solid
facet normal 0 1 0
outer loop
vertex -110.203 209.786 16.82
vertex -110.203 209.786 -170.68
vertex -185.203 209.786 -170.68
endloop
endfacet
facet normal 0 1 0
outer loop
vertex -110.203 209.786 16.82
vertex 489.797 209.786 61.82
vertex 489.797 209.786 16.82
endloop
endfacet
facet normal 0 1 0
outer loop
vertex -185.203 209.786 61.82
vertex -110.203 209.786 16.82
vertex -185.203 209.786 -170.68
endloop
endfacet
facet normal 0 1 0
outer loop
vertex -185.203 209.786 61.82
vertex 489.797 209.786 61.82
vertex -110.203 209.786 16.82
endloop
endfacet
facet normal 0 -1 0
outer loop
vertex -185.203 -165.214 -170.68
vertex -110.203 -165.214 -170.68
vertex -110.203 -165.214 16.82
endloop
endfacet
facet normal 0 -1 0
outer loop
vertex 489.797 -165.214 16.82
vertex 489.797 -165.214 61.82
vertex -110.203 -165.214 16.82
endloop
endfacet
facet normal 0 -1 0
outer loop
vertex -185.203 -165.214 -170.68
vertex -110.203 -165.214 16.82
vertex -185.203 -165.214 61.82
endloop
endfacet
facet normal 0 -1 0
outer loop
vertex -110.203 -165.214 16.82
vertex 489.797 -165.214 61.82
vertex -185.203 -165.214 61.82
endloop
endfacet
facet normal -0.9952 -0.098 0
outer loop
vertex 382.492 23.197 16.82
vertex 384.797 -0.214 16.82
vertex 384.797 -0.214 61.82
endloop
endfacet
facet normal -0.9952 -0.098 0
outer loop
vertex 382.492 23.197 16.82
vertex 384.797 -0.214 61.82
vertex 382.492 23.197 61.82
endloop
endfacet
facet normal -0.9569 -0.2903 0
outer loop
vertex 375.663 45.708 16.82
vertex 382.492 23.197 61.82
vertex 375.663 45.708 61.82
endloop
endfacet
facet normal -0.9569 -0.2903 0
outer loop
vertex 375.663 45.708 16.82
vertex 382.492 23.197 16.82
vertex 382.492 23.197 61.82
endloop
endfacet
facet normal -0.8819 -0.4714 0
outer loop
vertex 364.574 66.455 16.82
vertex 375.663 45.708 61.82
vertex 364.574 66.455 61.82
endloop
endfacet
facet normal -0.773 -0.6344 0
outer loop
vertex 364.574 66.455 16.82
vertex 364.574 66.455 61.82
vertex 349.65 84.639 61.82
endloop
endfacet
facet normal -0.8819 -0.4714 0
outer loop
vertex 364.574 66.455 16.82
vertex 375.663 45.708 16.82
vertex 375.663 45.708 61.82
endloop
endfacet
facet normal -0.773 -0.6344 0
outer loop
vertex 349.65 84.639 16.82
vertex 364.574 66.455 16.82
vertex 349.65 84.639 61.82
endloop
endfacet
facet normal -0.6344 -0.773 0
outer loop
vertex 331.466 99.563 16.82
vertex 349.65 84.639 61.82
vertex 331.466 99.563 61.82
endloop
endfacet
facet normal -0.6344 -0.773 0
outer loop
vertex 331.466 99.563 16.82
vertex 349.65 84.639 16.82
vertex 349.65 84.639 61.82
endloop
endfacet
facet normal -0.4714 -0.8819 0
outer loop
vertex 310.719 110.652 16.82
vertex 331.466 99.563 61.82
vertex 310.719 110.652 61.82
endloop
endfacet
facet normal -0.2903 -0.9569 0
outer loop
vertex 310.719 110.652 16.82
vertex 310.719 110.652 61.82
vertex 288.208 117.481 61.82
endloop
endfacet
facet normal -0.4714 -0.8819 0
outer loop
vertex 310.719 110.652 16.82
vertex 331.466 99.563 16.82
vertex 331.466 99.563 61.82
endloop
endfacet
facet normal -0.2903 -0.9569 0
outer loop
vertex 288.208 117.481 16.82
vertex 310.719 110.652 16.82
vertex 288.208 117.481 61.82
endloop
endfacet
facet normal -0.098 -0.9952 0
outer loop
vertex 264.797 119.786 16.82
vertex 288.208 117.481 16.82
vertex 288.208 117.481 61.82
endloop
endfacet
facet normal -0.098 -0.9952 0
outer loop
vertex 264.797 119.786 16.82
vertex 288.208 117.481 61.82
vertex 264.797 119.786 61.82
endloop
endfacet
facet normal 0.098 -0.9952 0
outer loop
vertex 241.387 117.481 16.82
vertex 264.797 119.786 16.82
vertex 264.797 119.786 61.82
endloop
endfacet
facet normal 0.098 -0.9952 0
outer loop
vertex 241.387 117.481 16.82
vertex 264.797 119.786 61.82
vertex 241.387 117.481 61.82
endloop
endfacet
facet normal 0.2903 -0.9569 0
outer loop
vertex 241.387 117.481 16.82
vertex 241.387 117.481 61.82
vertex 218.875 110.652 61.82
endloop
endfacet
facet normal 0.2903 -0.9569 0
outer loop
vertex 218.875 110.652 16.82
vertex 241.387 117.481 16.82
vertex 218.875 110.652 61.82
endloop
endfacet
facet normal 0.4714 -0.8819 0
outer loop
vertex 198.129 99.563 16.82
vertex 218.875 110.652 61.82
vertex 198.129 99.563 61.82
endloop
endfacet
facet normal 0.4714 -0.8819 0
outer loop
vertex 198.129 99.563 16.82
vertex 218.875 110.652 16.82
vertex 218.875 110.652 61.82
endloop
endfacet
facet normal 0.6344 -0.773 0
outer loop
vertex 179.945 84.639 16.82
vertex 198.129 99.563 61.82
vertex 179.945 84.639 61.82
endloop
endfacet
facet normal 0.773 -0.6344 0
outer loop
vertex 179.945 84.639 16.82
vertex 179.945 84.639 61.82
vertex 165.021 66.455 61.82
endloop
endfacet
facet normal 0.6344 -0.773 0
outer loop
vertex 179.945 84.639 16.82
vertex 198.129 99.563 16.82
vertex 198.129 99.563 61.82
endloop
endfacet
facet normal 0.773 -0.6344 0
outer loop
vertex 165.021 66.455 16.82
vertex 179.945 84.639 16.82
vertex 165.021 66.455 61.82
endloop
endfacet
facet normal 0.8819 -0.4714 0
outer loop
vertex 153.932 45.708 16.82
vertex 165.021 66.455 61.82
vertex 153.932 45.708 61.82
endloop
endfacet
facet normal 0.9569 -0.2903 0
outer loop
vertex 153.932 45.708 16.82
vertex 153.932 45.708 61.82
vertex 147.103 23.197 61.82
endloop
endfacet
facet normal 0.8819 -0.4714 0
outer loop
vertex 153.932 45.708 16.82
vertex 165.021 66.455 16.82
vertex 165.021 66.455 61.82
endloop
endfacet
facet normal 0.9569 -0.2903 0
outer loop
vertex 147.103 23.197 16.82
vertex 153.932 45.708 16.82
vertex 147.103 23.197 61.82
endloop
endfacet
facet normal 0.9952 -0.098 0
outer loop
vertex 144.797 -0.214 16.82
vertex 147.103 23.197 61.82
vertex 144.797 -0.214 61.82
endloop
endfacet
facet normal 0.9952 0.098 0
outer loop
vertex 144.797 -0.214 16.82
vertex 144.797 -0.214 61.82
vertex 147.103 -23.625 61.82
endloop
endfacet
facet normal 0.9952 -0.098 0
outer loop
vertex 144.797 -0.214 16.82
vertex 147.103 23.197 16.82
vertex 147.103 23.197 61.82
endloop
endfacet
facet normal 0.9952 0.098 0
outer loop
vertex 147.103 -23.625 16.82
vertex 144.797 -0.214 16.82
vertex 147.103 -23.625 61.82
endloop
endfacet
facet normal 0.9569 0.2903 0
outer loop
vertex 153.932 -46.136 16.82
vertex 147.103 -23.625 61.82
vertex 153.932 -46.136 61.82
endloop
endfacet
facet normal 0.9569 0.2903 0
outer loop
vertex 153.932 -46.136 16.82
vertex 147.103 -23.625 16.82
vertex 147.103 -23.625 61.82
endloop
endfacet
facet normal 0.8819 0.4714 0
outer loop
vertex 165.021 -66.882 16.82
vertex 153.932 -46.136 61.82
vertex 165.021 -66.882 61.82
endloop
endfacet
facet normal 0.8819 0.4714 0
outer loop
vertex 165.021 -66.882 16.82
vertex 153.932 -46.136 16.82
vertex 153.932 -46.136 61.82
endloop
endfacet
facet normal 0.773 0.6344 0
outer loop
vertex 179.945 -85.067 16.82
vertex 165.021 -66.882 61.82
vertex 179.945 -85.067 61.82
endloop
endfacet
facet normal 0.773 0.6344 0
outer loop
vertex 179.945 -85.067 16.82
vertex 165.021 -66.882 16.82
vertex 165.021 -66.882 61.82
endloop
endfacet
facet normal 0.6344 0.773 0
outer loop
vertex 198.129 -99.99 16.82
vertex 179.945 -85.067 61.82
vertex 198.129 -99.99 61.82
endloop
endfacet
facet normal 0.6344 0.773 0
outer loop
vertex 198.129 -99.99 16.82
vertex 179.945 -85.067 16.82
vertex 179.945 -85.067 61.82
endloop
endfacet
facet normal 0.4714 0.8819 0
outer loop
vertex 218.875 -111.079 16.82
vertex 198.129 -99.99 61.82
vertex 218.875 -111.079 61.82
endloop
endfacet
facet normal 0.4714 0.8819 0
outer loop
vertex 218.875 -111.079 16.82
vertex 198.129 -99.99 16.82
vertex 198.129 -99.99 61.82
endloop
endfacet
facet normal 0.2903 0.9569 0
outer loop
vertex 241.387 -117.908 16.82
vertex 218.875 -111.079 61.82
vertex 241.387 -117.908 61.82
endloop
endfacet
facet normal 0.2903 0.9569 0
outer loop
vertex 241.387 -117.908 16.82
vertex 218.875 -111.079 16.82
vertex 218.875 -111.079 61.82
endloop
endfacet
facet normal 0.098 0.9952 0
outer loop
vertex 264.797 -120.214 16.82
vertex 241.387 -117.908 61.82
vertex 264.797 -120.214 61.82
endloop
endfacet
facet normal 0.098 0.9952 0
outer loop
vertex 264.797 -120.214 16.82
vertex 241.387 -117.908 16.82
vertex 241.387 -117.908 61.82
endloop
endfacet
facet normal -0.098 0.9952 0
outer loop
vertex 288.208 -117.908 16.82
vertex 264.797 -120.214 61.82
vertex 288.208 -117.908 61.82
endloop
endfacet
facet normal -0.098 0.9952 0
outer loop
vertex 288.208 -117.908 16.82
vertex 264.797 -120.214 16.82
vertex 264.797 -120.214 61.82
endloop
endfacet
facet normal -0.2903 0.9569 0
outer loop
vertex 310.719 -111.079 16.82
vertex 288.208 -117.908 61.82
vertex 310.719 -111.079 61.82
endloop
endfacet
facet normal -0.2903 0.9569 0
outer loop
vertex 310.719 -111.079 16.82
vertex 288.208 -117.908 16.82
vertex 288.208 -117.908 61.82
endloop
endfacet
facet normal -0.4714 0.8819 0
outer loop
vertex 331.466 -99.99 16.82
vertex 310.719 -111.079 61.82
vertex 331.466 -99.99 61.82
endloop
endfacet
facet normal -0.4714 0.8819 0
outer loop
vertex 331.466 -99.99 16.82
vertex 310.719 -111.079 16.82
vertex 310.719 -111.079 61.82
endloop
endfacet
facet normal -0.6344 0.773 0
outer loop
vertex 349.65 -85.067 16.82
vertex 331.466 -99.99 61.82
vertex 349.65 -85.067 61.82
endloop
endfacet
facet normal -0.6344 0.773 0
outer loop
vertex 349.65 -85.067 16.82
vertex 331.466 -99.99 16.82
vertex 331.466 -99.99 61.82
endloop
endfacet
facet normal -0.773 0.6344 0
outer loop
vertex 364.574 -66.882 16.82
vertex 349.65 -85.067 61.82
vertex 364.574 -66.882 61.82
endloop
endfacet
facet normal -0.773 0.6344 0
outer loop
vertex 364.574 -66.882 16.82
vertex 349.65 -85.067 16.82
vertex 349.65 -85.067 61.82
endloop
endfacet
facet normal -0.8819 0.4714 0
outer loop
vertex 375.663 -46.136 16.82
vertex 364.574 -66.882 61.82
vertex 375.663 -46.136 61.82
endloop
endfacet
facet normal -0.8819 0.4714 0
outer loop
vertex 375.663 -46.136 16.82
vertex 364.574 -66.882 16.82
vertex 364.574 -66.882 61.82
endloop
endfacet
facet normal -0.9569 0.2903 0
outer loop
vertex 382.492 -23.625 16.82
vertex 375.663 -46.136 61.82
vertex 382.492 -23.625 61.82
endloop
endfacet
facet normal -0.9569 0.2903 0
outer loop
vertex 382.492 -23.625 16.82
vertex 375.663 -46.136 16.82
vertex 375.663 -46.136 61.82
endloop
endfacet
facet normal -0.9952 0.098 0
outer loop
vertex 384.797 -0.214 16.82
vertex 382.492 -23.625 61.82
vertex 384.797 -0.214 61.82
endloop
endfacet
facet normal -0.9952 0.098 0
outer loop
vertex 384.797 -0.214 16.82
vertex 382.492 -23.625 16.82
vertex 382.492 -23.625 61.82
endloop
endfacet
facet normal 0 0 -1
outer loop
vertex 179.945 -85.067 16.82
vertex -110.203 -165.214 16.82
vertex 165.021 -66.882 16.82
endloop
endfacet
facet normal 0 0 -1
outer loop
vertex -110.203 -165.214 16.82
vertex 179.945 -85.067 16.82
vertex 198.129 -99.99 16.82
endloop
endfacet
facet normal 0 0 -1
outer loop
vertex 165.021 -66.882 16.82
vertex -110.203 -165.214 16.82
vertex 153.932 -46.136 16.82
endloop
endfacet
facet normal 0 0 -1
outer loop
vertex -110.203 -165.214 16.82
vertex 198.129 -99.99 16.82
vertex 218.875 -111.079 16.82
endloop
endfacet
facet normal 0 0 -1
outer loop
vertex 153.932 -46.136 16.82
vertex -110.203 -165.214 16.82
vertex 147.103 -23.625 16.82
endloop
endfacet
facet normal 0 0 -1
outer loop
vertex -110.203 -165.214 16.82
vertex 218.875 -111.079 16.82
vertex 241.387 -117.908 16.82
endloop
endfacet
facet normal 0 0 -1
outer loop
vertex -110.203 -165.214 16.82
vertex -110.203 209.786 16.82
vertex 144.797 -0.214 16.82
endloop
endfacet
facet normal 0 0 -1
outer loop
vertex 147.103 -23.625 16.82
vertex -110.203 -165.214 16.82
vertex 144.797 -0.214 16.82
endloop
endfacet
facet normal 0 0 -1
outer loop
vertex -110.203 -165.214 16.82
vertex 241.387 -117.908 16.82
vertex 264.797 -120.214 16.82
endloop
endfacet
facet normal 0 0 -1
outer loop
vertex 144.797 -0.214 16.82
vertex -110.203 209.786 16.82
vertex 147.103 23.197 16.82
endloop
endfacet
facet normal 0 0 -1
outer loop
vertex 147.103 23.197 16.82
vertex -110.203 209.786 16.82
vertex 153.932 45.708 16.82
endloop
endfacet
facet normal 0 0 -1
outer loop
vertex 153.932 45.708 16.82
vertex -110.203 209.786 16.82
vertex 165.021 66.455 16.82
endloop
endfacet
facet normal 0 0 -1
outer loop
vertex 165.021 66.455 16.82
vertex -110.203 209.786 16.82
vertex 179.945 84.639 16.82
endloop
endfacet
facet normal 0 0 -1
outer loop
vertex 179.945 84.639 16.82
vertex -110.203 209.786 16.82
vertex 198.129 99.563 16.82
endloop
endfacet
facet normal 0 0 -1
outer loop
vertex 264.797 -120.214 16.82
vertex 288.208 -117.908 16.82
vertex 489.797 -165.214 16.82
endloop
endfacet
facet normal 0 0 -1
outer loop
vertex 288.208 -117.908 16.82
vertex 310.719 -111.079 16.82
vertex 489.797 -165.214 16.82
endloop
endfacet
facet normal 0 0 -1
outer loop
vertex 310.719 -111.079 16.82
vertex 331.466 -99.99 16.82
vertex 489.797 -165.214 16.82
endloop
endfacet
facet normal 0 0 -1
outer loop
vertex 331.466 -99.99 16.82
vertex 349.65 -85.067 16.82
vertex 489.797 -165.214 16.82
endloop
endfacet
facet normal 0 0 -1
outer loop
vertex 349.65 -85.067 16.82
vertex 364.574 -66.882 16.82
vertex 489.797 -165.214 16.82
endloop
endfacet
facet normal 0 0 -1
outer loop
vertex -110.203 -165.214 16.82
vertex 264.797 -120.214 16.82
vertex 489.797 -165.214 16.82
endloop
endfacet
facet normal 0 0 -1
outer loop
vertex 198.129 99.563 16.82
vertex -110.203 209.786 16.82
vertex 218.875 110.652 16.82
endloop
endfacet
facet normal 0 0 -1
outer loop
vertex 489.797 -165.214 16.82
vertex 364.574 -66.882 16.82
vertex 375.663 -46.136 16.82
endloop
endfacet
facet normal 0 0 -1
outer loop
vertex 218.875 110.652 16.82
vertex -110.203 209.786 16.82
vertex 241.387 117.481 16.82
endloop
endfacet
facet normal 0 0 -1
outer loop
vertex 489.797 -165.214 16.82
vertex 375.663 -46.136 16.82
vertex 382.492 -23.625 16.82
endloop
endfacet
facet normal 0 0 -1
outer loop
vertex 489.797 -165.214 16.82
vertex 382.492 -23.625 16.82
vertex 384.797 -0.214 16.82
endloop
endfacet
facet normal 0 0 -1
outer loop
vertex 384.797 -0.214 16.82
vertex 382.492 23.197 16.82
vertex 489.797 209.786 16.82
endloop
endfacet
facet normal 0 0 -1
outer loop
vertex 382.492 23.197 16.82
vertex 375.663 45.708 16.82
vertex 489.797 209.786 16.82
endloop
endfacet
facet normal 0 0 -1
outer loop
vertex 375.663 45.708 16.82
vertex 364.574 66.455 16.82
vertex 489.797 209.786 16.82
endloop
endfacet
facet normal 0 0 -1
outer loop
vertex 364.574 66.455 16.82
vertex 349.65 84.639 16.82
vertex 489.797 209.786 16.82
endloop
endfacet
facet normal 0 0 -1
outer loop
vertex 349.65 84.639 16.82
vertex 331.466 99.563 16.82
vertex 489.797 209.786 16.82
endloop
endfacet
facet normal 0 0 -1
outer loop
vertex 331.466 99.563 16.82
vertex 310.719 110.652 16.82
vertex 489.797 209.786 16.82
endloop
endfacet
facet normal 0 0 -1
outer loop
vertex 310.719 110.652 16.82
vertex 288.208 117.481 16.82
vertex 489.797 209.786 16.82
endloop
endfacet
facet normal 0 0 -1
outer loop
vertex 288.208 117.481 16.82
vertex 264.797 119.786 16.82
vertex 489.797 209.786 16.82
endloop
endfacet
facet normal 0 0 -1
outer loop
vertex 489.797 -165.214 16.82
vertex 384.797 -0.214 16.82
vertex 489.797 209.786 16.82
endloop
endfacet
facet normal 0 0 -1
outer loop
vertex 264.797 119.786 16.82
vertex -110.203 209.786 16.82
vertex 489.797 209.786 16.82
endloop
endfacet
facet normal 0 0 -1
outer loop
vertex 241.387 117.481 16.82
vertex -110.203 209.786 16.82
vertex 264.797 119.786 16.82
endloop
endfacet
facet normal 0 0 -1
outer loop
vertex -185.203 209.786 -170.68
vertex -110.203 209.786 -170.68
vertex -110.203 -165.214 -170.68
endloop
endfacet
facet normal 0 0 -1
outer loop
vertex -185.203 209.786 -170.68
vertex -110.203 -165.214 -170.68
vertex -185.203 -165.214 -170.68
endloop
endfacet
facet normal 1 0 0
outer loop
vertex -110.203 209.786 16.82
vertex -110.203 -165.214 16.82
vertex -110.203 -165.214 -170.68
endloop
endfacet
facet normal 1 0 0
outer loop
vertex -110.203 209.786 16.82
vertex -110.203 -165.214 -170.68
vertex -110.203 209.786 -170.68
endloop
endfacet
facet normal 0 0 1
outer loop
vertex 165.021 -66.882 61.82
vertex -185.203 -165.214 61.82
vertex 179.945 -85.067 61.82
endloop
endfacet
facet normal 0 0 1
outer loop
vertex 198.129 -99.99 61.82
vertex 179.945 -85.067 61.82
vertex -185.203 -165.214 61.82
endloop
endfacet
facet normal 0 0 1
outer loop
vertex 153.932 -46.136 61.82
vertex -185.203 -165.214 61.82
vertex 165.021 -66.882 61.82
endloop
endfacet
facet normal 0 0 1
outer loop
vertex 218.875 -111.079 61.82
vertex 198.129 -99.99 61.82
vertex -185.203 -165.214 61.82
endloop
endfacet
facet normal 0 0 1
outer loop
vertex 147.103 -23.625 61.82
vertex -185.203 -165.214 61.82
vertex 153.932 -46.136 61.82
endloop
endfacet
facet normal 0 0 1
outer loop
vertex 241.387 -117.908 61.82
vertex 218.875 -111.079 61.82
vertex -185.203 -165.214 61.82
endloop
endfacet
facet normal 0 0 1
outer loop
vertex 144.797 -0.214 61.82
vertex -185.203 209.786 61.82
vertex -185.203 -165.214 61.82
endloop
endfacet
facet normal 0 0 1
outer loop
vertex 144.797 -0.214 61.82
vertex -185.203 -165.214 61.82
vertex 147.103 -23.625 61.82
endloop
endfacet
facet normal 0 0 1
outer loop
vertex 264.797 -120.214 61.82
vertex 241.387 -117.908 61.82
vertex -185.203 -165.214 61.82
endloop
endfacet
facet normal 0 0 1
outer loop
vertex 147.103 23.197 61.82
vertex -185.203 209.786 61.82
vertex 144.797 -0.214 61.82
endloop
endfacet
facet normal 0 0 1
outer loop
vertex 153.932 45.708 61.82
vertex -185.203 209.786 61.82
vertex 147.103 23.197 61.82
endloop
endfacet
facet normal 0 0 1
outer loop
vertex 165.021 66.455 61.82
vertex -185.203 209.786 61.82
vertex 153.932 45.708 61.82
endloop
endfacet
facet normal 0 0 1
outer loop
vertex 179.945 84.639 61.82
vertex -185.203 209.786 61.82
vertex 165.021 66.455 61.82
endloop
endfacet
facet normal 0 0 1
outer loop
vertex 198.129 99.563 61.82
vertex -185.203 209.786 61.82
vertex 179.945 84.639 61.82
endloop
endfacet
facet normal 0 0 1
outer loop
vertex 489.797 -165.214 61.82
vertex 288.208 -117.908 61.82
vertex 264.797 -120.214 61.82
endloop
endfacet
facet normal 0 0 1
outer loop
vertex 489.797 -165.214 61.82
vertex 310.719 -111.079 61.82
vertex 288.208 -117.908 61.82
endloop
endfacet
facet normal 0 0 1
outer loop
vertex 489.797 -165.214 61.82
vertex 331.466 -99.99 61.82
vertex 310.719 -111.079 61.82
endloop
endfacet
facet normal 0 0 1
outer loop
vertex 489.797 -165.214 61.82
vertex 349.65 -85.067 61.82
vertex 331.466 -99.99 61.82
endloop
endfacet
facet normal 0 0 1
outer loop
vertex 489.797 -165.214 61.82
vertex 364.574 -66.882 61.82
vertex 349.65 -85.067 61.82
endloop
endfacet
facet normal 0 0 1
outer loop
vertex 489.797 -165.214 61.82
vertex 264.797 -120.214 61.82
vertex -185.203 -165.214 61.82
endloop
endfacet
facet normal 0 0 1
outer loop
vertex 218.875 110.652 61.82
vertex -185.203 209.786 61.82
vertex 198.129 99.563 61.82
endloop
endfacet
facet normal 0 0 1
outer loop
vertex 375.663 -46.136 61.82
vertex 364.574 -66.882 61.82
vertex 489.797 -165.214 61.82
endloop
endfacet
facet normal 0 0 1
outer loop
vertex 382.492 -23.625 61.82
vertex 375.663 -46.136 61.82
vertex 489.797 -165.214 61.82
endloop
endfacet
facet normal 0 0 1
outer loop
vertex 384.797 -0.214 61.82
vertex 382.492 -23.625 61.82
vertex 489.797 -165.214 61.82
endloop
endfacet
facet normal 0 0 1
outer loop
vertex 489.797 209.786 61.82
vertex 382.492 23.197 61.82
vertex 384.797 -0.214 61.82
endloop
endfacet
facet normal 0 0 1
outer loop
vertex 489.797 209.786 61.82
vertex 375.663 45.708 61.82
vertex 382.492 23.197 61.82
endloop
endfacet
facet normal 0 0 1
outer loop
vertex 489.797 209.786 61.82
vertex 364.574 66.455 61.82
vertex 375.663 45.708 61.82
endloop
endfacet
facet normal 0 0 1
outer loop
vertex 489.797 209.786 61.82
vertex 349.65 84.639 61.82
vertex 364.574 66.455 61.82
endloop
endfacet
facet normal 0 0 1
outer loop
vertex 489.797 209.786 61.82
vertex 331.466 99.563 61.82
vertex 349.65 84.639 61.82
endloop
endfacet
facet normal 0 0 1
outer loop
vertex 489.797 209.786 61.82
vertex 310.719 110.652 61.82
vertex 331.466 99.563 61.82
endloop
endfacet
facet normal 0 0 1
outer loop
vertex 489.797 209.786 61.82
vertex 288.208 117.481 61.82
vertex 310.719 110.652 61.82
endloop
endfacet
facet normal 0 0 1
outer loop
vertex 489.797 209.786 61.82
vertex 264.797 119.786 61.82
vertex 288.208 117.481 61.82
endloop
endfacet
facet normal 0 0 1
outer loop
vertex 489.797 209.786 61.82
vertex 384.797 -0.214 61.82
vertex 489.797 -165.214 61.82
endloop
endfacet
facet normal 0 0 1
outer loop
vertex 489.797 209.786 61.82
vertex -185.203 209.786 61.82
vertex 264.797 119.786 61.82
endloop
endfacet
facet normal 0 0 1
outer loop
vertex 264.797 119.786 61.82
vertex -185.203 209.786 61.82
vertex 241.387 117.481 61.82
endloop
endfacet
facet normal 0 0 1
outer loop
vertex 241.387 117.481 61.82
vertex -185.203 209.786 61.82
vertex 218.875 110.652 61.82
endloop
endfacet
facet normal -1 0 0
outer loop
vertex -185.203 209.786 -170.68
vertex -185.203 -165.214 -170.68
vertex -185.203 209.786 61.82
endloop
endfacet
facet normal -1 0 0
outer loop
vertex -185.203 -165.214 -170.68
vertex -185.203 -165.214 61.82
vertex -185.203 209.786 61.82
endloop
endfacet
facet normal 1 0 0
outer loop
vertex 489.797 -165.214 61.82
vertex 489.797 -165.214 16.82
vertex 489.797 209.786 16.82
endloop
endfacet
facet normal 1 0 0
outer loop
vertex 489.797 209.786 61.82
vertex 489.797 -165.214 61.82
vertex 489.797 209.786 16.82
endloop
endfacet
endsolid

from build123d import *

# Parameters (mm, degrees)
SKETCH1_W           = 90
SKETCH1_H           = 50
SKETCH1_R           = 16
BOSS_EXTRUDE1_DEPTH = 6
SKETCH3_W           = 10
SKETCH3_H           = 50
BOSS_EXTRUDE2_DEPTH = 25
SCALE1_SCALE        = 7.5


with BuildPart() as part:
    # Sketch1 → Boss-Extrude1 (new body)
    with BuildSketch(Plane.XY):
        with Locations((45, 25)):
            Rectangle(SKETCH1_W, SKETCH1_H)
        with Locations((60, 22)):
            Circle(SKETCH1_R, mode=Mode.SUBTRACT)
    extrude(amount=BOSS_EXTRUDE1_DEPTH)

    # Sketch3 → Boss-Extrude2 (add)
    with BuildSketch(Plane(origin=(0, 0, 0), x_dir=(-1, 0, 0), z_dir=(0, 0, -1))):
        with Locations((-5, 25)):
            Rectangle(SKETCH3_W, SKETCH3_H)
    extrude(amount=BOSS_EXTRUDE2_DEPTH)


with BuildPart() as part_1:
    # Scale1: scaled about (28.492708796, 25.417495659, -2.587677502)
    add(part.part.scale(SCALE1_SCALE).moved(Location((-185.202607174, -165.213721784, 16.819903763))))


solid = part_1.part
